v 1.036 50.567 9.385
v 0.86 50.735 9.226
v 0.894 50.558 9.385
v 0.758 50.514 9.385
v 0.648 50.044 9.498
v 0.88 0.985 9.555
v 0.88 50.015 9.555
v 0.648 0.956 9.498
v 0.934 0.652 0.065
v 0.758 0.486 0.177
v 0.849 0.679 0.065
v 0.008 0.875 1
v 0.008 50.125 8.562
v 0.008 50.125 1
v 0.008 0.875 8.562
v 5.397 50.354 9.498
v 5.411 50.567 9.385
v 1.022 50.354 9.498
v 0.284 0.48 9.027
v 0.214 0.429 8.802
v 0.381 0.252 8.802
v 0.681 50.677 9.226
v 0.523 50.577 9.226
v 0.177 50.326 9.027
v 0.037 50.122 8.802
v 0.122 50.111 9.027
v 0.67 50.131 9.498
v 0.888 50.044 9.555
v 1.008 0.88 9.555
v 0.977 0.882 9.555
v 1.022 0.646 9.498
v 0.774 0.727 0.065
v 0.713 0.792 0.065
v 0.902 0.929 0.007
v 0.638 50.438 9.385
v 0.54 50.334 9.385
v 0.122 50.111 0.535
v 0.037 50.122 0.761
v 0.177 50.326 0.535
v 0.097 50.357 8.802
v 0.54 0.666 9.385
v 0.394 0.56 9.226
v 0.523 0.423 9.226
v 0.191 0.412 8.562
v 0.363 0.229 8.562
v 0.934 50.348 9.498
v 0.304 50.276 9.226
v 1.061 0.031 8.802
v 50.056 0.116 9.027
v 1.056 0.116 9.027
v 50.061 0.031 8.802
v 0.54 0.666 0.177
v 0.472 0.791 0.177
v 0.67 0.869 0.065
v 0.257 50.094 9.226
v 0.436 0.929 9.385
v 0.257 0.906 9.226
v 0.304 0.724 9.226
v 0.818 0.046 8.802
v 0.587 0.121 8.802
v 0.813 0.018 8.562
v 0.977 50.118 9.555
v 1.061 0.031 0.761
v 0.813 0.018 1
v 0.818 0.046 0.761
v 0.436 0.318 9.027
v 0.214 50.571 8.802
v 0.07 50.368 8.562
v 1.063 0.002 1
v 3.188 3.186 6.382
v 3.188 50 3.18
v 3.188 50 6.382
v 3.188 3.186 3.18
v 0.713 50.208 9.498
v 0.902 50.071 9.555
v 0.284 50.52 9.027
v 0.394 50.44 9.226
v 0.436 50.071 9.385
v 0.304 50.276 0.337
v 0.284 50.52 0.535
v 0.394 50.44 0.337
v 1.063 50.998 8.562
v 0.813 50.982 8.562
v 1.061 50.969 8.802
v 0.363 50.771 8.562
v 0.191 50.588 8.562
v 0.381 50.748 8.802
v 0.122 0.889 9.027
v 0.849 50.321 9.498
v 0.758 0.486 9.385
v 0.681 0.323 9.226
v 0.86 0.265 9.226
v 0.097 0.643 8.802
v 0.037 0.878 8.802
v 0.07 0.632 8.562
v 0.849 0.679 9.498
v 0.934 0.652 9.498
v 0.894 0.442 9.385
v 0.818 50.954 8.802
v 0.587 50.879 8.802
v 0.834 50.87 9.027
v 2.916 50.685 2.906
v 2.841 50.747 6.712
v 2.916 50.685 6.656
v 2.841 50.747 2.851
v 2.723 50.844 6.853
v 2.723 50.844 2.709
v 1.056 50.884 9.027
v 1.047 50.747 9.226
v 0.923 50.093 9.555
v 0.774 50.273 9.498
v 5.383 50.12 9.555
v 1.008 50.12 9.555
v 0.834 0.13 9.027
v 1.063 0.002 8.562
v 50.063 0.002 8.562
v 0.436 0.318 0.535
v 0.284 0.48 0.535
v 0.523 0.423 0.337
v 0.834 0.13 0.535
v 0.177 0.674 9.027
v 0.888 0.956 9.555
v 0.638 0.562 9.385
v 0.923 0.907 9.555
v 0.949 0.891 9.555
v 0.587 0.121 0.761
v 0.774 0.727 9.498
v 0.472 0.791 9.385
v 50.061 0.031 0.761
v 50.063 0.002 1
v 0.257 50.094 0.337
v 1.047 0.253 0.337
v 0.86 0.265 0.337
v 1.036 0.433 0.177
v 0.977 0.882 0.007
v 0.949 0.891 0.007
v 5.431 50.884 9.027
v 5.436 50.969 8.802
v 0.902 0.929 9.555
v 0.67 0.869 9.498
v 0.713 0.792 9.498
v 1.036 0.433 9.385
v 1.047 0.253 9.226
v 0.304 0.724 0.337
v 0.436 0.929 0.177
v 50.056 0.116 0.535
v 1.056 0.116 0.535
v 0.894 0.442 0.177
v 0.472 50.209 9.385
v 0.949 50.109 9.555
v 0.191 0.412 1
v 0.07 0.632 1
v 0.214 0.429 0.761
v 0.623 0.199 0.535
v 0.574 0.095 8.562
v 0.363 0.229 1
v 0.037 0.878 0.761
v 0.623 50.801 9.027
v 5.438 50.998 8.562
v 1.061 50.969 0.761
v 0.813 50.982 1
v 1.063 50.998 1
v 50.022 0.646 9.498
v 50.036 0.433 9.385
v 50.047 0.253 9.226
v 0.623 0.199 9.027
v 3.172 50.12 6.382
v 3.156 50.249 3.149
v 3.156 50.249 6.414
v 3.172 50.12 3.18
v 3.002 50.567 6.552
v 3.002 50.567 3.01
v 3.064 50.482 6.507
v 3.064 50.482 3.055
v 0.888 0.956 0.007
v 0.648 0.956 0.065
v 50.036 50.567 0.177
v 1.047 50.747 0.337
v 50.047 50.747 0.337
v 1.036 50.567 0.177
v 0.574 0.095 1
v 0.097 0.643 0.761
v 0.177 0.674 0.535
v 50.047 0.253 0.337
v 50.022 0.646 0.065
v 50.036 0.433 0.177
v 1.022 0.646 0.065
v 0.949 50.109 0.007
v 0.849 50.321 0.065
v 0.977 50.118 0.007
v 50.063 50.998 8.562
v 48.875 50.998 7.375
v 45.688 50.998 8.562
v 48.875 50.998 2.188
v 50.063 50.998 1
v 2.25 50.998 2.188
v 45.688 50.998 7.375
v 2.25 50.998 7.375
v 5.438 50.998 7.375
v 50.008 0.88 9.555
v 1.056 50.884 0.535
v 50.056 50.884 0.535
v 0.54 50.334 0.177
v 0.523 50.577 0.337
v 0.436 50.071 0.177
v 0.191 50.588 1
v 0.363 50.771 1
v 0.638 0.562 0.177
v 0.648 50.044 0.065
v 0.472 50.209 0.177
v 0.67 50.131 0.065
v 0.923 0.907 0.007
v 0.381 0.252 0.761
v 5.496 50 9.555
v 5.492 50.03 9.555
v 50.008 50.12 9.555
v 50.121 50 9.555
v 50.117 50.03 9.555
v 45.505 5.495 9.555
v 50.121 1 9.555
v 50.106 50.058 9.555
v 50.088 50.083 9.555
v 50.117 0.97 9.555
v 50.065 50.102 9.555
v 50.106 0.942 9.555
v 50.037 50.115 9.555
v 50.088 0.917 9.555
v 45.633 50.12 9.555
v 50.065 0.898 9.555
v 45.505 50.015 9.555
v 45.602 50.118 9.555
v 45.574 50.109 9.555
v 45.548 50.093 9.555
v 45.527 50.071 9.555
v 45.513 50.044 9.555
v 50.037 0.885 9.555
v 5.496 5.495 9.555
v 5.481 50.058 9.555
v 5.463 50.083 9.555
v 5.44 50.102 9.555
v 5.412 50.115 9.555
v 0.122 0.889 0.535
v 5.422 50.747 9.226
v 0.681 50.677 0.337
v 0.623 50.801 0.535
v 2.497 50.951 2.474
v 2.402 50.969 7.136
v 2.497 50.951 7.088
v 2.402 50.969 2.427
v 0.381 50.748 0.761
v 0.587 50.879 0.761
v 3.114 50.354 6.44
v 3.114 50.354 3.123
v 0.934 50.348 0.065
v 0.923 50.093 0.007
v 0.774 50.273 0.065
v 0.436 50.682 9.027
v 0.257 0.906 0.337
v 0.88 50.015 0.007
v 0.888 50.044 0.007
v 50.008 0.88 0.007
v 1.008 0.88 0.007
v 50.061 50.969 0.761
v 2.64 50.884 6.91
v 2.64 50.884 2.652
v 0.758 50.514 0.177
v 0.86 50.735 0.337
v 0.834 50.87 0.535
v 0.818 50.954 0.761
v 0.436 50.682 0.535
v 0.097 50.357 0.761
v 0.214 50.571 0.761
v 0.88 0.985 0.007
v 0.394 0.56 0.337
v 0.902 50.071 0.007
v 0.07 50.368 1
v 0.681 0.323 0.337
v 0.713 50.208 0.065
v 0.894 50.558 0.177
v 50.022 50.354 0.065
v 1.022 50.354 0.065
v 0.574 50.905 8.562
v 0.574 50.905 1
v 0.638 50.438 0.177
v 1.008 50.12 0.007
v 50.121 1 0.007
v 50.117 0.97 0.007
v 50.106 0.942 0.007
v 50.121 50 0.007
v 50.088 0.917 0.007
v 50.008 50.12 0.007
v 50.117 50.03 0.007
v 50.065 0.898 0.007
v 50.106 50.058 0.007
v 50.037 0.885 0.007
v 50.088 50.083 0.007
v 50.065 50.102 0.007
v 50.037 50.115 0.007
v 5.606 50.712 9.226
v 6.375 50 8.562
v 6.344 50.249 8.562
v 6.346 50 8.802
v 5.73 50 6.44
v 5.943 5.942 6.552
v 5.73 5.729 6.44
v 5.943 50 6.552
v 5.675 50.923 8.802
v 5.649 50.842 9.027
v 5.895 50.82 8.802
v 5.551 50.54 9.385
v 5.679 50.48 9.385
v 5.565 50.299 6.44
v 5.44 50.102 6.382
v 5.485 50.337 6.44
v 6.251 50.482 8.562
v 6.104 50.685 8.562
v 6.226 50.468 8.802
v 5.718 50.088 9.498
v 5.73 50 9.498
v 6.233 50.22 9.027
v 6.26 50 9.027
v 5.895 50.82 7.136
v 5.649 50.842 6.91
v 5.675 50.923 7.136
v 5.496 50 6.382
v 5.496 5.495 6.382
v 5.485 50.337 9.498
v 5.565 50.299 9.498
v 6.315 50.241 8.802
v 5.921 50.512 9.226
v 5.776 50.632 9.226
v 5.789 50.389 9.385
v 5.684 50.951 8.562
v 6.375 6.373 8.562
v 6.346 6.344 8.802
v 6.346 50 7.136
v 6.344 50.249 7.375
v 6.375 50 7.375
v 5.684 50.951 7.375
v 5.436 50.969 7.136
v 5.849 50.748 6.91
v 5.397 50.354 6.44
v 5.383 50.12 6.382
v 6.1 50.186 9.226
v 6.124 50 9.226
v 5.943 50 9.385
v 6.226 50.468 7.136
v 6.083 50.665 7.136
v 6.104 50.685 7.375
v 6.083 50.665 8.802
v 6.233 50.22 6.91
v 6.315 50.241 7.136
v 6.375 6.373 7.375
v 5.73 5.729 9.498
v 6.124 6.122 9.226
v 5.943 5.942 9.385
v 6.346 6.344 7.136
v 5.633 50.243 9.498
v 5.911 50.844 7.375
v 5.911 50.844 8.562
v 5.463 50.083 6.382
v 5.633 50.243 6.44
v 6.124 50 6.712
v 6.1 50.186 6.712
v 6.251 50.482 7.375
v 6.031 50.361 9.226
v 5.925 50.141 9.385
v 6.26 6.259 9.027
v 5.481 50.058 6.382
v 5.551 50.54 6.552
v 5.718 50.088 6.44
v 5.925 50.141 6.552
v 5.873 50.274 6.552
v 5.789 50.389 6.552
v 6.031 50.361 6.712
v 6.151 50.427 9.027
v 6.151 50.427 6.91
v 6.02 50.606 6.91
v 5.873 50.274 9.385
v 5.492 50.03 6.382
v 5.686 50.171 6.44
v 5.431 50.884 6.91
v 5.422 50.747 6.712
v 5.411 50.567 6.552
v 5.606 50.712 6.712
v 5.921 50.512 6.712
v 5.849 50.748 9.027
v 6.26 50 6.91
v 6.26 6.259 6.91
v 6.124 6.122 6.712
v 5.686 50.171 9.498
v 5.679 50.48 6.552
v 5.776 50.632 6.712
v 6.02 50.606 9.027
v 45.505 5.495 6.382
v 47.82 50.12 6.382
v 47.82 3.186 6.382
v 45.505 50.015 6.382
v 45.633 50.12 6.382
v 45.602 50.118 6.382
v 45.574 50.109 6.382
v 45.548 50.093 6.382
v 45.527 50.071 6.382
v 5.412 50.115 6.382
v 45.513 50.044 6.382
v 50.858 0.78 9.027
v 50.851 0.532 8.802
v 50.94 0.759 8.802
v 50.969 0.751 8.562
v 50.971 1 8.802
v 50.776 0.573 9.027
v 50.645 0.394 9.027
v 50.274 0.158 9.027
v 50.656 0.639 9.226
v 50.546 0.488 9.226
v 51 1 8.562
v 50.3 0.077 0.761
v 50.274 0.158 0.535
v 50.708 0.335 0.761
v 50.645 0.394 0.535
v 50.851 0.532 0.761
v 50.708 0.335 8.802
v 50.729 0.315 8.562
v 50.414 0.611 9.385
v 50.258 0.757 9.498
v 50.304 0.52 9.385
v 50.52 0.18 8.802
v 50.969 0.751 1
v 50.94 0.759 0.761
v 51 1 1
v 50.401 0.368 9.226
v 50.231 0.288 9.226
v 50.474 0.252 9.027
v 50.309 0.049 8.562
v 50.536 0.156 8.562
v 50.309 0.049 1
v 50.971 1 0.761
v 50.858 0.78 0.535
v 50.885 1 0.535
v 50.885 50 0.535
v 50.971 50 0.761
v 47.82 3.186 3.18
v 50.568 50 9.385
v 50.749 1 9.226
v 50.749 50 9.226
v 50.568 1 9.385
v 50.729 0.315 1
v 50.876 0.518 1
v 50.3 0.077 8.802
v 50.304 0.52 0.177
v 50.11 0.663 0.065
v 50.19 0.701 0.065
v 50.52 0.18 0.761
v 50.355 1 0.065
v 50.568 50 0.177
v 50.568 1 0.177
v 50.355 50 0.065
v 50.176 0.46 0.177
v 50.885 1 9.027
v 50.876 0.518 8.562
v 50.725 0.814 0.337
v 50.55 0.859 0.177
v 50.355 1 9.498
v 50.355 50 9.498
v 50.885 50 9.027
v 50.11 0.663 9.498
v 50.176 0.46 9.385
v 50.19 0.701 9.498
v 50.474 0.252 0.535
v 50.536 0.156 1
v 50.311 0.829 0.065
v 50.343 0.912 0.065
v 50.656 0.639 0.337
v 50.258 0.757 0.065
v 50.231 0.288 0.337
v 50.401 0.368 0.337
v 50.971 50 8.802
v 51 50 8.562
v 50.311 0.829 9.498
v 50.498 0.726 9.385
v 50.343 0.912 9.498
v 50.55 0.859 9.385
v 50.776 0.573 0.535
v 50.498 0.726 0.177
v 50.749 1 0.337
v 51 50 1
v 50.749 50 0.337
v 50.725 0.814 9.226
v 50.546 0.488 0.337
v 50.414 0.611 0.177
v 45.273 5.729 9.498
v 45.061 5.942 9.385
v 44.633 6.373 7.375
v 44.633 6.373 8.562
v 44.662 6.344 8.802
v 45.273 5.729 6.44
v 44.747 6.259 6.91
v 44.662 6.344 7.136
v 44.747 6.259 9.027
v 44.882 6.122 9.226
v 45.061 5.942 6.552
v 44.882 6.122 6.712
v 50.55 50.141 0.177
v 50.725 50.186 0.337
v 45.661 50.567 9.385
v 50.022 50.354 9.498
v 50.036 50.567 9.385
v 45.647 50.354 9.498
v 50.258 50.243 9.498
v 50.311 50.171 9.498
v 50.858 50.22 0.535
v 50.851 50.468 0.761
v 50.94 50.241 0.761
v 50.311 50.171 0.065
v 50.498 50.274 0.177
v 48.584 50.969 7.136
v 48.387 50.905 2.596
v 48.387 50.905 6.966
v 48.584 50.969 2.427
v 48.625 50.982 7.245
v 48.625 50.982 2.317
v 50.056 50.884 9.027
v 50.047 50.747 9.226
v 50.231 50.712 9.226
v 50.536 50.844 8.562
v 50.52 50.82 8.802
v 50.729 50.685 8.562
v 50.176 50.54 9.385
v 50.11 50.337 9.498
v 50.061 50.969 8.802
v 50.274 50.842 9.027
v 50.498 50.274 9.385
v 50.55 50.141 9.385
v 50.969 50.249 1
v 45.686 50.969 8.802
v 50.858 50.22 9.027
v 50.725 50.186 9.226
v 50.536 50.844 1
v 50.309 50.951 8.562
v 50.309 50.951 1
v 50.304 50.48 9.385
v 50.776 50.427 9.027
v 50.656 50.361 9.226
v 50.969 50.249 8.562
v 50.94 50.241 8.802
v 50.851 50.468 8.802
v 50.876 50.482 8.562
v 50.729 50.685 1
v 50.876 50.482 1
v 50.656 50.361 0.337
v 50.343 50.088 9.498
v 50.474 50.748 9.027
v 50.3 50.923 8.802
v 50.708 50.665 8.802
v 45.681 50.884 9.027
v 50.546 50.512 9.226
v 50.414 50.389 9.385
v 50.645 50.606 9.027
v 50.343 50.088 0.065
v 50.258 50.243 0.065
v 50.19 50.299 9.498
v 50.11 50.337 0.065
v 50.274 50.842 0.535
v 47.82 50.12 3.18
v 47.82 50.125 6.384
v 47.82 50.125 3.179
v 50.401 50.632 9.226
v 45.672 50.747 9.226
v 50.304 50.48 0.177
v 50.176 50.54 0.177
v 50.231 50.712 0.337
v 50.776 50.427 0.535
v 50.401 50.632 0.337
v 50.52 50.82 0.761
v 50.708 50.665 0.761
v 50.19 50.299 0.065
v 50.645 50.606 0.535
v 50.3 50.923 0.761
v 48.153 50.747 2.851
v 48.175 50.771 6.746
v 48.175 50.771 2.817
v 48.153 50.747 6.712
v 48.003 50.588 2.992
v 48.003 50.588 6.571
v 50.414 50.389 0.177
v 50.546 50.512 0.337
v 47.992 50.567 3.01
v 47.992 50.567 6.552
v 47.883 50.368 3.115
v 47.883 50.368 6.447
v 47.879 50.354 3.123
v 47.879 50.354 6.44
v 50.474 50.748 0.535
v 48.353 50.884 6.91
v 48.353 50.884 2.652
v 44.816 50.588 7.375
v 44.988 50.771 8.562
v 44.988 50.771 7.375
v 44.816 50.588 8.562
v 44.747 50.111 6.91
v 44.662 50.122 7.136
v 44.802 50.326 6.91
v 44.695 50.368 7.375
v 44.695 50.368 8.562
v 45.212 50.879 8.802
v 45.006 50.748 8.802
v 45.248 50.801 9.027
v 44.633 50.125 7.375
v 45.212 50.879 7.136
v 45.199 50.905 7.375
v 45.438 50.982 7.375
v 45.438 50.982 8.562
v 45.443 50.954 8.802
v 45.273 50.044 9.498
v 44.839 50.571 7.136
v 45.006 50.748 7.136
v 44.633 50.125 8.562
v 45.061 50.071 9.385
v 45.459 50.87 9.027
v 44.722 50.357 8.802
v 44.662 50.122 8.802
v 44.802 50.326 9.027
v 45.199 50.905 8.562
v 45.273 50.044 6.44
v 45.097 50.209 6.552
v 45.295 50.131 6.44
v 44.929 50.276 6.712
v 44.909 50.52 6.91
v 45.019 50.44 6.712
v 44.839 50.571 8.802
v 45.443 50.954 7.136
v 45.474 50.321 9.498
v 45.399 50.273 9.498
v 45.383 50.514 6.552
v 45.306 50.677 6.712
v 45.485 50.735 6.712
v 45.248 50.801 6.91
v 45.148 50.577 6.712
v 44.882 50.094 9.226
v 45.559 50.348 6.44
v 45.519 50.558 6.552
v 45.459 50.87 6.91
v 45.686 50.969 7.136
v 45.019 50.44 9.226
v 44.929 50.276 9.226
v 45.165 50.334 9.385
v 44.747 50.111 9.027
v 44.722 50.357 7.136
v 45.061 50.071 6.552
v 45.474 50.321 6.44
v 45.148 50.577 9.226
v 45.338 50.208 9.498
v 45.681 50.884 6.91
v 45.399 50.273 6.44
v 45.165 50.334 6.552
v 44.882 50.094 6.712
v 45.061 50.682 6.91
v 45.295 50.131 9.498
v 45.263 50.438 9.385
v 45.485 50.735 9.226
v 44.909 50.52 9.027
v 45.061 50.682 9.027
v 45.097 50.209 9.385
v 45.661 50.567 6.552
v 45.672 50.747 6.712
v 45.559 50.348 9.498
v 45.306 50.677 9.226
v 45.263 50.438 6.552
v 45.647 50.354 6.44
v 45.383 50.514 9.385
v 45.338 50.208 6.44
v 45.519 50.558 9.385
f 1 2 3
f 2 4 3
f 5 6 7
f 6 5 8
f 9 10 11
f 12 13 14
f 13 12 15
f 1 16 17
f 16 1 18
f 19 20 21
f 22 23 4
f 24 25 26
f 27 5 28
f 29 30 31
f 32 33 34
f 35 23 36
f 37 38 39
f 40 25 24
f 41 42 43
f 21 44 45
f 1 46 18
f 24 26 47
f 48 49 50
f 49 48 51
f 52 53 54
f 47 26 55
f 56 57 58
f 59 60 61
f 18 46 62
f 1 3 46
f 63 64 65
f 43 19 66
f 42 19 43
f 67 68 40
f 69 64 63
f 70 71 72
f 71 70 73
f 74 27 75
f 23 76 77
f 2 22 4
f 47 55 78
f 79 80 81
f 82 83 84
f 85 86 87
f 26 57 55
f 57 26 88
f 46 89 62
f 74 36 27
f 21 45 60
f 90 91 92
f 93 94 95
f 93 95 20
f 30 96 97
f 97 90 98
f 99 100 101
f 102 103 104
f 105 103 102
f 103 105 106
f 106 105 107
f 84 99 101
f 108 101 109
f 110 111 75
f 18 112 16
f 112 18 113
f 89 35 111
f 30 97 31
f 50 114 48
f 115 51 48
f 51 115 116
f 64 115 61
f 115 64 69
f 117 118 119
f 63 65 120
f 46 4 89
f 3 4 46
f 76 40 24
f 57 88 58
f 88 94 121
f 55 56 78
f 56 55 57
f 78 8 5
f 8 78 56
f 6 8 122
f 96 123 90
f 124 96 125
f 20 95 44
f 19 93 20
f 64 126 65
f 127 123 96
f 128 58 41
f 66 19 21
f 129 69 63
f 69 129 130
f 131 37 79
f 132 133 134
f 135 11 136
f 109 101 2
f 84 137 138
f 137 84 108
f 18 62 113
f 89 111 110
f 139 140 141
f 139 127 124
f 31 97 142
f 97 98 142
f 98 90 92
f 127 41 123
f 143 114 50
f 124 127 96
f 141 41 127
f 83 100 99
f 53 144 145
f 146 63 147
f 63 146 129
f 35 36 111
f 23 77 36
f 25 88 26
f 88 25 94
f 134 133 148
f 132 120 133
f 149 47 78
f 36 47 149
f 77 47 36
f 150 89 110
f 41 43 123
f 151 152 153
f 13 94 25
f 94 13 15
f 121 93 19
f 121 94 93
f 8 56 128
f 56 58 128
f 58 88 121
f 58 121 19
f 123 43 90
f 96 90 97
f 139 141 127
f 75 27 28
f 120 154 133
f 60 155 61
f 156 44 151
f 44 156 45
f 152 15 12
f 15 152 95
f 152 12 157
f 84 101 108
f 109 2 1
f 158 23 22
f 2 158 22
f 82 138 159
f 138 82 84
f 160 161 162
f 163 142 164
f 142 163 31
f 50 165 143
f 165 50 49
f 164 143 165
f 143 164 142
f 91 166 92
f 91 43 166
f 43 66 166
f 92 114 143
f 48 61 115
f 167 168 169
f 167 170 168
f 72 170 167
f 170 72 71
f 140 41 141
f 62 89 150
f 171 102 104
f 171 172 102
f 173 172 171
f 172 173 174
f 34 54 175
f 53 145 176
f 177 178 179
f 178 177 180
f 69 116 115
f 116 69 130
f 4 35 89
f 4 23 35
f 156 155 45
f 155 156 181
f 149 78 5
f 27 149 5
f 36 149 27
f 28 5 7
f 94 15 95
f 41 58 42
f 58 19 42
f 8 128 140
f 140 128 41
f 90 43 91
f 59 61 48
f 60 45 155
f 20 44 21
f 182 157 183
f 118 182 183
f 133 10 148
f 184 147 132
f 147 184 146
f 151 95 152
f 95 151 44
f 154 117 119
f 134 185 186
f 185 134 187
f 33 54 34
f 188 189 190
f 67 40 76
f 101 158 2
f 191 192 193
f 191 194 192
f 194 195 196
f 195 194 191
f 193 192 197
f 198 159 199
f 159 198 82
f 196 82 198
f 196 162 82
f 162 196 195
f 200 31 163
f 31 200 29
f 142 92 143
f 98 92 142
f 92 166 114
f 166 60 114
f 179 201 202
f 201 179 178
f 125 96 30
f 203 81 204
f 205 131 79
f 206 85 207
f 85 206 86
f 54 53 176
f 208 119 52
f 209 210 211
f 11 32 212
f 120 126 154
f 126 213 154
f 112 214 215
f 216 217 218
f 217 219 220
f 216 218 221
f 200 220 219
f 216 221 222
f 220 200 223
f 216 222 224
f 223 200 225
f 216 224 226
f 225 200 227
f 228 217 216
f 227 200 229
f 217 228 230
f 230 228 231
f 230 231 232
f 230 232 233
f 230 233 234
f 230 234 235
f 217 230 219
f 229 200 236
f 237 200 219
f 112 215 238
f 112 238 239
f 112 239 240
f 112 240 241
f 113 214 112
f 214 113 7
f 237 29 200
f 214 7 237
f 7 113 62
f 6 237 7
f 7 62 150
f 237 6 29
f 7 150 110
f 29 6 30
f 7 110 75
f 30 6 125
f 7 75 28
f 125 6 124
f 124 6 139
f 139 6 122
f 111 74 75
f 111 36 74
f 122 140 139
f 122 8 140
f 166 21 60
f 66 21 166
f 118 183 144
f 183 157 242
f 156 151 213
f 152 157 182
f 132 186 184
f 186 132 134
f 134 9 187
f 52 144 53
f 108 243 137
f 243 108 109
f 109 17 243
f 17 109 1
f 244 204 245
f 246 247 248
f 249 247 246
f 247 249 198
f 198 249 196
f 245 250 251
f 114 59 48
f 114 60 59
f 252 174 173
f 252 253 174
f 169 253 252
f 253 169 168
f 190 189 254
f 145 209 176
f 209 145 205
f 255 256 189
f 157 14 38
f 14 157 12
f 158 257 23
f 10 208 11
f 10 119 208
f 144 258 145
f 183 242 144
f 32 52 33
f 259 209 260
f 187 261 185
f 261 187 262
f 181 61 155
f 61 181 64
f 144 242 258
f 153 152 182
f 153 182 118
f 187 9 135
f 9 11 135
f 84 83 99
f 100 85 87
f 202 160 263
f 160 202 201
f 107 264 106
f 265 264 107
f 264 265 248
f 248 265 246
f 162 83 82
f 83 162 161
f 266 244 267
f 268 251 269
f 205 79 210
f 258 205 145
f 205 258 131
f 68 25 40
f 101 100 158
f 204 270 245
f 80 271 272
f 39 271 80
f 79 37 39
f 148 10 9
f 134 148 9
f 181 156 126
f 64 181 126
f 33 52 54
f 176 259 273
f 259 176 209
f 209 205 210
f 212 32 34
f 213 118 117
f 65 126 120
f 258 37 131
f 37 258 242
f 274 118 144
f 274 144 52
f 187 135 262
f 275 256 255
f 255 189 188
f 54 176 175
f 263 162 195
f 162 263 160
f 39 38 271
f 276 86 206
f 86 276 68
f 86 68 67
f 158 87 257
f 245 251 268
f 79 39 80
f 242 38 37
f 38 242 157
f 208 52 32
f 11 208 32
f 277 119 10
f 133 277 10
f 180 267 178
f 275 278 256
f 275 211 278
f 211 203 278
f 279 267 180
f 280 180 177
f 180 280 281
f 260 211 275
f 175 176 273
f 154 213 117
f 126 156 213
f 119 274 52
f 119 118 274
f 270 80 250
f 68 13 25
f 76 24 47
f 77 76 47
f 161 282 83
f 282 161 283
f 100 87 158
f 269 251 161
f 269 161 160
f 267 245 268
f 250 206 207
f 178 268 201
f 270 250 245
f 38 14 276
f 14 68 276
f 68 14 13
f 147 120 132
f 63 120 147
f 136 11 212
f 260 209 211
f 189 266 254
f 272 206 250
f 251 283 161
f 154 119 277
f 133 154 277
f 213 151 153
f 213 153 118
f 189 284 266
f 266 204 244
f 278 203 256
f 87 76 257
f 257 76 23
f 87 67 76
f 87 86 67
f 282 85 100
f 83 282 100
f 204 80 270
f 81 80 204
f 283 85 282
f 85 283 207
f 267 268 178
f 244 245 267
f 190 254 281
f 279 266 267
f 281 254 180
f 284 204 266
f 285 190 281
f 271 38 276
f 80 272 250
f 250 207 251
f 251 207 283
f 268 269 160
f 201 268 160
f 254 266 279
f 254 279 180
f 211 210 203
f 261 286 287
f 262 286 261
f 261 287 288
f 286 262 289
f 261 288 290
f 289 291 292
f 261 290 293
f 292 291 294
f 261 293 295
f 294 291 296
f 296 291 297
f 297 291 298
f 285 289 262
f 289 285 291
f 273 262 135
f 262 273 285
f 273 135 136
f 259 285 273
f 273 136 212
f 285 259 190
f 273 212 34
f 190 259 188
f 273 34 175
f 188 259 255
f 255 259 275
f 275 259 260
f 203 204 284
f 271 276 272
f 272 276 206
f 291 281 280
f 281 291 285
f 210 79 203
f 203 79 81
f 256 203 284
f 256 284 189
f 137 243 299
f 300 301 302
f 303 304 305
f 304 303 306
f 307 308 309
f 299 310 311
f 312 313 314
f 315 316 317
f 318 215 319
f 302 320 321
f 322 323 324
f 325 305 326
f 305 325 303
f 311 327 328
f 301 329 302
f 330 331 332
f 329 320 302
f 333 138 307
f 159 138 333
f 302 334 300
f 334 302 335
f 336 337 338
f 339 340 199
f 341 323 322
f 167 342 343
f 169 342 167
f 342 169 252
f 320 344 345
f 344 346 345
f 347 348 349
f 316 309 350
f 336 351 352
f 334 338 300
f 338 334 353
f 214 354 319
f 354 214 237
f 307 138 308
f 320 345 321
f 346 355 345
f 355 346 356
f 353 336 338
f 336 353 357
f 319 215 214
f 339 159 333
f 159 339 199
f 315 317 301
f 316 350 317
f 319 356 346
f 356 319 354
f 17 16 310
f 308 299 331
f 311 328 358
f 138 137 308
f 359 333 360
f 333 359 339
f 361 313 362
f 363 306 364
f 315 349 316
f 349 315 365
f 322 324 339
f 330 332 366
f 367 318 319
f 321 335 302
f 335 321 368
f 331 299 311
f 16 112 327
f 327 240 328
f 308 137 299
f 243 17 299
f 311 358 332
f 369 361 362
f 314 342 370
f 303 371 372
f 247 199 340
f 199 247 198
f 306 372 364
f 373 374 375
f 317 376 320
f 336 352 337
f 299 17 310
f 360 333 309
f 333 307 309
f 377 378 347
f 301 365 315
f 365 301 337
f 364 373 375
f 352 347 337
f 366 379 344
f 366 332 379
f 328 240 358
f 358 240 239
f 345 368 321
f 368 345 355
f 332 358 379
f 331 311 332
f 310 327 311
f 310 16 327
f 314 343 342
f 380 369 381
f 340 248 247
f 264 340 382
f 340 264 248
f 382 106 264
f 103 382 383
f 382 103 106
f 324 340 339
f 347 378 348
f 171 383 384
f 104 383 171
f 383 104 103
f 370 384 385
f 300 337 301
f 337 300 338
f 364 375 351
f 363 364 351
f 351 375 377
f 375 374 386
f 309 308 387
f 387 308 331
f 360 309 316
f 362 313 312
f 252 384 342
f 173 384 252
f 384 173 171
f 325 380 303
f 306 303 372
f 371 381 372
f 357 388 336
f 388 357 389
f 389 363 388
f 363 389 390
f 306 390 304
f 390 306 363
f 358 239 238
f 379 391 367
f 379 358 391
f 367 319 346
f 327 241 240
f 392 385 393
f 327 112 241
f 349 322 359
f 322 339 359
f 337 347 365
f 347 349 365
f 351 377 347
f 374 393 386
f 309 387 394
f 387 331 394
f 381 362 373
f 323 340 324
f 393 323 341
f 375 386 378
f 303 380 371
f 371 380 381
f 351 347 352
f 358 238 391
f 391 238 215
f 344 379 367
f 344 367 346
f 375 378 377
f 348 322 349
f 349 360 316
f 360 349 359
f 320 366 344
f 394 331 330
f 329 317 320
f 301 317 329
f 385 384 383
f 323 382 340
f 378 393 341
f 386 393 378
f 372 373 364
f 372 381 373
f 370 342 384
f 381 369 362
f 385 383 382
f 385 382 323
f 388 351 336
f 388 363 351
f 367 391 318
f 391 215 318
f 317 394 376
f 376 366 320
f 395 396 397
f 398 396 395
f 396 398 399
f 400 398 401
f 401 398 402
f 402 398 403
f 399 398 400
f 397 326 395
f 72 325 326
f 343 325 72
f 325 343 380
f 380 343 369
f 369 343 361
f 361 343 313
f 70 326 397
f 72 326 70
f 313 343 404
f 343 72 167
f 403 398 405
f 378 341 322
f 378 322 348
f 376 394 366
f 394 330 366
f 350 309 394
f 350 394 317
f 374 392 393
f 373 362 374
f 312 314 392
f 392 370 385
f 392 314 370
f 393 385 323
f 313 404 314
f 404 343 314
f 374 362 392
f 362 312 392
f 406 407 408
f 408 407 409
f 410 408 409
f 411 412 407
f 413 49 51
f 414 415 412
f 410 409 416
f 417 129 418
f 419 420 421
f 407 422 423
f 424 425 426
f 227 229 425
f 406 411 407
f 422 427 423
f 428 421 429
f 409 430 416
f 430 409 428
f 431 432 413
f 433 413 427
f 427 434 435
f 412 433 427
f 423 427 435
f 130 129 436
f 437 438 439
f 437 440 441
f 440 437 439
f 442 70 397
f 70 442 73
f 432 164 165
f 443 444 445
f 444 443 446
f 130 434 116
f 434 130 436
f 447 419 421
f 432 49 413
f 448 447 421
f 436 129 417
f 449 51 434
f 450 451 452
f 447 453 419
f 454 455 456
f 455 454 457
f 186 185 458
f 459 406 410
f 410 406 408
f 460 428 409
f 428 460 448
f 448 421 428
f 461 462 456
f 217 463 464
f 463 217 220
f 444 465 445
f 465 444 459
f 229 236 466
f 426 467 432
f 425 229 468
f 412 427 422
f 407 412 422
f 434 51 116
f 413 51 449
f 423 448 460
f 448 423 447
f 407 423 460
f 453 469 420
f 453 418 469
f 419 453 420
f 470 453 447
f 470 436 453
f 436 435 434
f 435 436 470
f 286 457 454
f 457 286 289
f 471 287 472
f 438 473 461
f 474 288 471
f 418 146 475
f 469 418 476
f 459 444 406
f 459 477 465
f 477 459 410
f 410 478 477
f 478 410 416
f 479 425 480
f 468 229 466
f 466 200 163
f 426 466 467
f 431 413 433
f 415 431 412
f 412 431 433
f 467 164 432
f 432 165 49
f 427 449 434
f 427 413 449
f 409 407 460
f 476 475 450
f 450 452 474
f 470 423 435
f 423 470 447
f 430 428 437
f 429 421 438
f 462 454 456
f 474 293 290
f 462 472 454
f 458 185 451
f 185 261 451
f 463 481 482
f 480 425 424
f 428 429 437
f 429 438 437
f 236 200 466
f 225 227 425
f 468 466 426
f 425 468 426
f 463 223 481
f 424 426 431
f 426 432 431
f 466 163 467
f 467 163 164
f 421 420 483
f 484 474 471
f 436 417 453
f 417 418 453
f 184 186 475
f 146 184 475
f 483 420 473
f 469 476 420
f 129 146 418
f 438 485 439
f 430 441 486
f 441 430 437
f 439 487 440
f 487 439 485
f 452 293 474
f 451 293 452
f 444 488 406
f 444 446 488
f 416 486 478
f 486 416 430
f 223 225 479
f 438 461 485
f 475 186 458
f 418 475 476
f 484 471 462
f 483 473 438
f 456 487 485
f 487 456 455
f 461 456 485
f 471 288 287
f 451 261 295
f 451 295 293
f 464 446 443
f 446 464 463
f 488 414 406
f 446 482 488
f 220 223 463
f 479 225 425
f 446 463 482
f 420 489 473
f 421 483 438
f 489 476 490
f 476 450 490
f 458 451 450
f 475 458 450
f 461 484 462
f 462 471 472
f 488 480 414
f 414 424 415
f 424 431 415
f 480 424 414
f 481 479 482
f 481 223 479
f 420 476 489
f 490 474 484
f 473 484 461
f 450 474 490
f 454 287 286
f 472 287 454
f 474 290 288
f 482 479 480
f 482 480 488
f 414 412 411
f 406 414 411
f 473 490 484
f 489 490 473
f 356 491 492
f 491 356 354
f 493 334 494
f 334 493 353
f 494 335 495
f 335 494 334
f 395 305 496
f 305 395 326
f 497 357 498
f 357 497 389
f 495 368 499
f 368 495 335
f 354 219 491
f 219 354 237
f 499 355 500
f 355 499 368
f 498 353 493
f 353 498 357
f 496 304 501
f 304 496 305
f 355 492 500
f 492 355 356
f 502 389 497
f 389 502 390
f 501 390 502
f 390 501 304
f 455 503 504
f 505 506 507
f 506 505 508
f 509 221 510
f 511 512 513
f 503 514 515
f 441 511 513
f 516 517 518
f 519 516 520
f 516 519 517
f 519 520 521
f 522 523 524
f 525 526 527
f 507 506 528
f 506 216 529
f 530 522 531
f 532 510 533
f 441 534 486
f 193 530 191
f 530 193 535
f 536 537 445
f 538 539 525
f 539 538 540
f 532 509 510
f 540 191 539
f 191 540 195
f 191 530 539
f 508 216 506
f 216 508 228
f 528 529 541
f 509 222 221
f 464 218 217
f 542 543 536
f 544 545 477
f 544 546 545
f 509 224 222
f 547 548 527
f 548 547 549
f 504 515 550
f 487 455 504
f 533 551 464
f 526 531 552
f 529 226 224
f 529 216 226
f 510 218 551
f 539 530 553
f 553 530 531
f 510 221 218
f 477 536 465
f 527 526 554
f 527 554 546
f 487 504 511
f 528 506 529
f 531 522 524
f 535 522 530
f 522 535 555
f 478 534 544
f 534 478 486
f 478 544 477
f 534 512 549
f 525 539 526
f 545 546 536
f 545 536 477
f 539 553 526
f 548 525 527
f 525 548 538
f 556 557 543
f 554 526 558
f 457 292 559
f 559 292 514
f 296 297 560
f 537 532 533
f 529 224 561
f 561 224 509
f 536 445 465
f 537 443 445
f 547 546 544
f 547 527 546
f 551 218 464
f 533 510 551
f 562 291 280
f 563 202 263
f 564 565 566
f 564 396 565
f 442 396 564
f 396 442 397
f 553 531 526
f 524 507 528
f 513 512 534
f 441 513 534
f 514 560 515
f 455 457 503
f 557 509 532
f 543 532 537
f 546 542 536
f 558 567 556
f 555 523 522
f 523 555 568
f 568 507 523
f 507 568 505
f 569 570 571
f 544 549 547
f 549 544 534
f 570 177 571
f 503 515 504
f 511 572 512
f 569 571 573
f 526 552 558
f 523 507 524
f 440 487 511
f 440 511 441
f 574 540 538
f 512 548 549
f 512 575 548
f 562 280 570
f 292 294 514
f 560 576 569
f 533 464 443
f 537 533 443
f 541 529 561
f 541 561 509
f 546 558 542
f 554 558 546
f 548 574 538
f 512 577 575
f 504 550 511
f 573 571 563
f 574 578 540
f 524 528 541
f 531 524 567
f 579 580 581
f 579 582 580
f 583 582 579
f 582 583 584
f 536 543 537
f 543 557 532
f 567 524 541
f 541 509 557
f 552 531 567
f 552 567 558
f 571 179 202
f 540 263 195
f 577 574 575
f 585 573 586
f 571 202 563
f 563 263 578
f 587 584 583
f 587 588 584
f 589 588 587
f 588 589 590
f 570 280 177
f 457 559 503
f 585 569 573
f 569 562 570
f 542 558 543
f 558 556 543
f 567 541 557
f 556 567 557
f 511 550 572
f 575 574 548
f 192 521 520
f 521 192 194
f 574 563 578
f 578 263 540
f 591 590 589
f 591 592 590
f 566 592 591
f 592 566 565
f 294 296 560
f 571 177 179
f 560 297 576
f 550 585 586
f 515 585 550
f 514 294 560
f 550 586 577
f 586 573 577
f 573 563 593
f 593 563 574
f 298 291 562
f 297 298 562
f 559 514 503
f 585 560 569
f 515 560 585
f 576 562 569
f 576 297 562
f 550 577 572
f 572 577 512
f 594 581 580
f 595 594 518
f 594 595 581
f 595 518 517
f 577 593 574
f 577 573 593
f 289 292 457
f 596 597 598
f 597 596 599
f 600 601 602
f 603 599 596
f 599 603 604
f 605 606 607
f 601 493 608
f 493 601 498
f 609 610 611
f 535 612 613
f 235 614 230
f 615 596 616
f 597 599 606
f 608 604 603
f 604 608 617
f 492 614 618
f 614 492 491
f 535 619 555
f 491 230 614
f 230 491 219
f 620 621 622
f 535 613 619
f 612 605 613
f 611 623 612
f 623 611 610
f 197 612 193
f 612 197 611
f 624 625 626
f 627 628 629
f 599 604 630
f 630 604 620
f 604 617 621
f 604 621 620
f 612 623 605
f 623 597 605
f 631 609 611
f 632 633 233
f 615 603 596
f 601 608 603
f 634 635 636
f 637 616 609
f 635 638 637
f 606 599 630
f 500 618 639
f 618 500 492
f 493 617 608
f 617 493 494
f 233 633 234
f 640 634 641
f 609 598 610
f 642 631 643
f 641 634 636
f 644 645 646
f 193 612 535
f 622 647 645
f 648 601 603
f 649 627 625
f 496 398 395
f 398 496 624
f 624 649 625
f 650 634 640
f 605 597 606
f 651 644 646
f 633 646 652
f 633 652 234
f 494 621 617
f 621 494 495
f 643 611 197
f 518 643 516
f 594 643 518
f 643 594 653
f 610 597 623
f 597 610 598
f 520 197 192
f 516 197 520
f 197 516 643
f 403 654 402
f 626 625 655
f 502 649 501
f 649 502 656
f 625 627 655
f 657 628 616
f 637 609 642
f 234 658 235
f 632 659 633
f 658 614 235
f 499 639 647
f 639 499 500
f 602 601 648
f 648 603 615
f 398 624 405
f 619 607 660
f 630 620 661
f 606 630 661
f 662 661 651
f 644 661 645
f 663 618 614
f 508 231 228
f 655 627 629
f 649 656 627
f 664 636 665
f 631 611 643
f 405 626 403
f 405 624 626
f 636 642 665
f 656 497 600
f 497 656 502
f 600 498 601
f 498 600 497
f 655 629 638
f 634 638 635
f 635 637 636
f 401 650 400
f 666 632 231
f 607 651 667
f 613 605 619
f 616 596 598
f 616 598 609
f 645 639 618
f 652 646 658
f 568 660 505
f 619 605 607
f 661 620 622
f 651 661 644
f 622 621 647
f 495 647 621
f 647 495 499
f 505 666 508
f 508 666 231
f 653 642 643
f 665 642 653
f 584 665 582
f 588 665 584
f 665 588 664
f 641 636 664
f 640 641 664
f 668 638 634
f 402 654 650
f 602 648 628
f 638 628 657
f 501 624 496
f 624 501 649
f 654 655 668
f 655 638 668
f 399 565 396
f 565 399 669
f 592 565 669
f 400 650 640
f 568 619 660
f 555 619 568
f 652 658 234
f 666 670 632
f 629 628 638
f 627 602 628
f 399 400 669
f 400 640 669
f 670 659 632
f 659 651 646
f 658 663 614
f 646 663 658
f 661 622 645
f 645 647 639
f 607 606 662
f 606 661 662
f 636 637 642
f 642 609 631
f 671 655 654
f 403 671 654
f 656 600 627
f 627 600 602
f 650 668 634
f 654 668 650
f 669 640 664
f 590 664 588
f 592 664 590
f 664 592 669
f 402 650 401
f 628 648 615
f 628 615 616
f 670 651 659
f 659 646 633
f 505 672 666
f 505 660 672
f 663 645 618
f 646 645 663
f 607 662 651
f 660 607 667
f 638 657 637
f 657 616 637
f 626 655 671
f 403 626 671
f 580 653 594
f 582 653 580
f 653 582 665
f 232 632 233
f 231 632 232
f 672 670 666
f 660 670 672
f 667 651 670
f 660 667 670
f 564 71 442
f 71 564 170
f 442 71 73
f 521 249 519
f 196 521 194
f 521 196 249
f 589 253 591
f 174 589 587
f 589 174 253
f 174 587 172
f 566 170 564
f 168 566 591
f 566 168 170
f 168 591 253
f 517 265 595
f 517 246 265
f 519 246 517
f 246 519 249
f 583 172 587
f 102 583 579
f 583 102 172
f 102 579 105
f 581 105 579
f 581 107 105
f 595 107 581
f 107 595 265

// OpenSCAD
//fine = true; 
fine = false; 

$fn = fine ? 100 : 25;

roundcorner = 2; 

horn_arc = 45;

horn_diameter = 5;

base_size = 25.5;
plate_thickness = base_size / 8;




module plate2() {
    color("red") 
    translate([((base_size / 8) * 0) + (roundcorner / 2), ((base_size / 8) * 0) + (roundcorner / 2), (roundcorner / 2)]) {
        minkowski() {
            cube([((base_size / 8) * 8 * 2) - roundcorner, ((base_size / 8) * 8 * 2) - roundcorner, plate_thickness - roundcorner]);
            sphere(d = roundcorner);
        }
    }
}



module rail2() {
    color("grey") translate([((base_size / 8) * 0) + (roundcorner / 2), ((base_size / 8) * 0) + (roundcorner / 2), (roundcorner / 2)]) {
        minkowski() {
            cube([((base_size / 8) * 1) - roundcorner, ((base_size / 8) * 8 * 2) - roundcorner, (plate_thickness * 3) - roundcorner]);
            sphere(d = roundcorner);
        }
    }
    color("orange") translate([((base_size / 8) * 0) + (roundcorner / 2), ((base_size / 8) * 0) + (roundcorner / 2), (plate_thickness * 2)+ (roundcorner / 2)]) {
        minkowski() {
            cube([((base_size / 8) * 2) - roundcorner, ((base_size / 8) * 8 * 2) - roundcorner, (plate_thickness * 1) - roundcorner]);
            sphere(d = roundcorner);
        }
    }
    
    
    color("grey") translate([((base_size / 8) * 0) + (roundcorner / 2), ((base_size / 8) * 0) + (roundcorner / 2), (roundcorner / 2)]) {
        minkowski() {
            cube([((base_size / 8) * 16) - roundcorner, ((base_size / 8) * 1) - roundcorner, (plate_thickness * 3) - roundcorner]);
            sphere(d = roundcorner);
        }
    }
    
    
            color("orange") translate([((base_size / 8) * 0) + (roundcorner / 2), ((base_size / 8) * 0) + (roundcorner / 2), (plate_thickness * 2) + (roundcorner / 2)]) {
        minkowski() {
            cube([((base_size / 8) * 16) - roundcorner, ((base_size / 8) * 2) - roundcorner, (plate_thickness * 1) - roundcorner]);
            sphere(d = roundcorner);
        }
    }
    

    
    
    
    color("grey") translate([((base_size / 8) * 15) + (roundcorner / 2), ((base_size / 8) * 0) + (roundcorner / 2), (roundcorner / 2)]) {
        minkowski() {
            cube([((base_size / 8) * 1) - roundcorner, ((base_size / 8) * 8 * 2) - roundcorner, (plate_thickness * 3) - roundcorner]);
            sphere(d = roundcorner);
        }
    }
    
    
    

    
    
        color("orange") translate([((base_size / 8) * 14) + (roundcorner / 2), ((base_size / 8) * 0) + (roundcorner / 2), (plate_thickness * 2) + (roundcorner / 2)]) {
        minkowski() {
          cube([((base_size / 8) * 2) - roundcorner, ((base_size / 8) * 8 * 2) - roundcorner, (plate_thickness * 1) - roundcorner]);
            sphere(d = roundcorner);
        }
    }
    
    
    
}







plate2();
rail2();
